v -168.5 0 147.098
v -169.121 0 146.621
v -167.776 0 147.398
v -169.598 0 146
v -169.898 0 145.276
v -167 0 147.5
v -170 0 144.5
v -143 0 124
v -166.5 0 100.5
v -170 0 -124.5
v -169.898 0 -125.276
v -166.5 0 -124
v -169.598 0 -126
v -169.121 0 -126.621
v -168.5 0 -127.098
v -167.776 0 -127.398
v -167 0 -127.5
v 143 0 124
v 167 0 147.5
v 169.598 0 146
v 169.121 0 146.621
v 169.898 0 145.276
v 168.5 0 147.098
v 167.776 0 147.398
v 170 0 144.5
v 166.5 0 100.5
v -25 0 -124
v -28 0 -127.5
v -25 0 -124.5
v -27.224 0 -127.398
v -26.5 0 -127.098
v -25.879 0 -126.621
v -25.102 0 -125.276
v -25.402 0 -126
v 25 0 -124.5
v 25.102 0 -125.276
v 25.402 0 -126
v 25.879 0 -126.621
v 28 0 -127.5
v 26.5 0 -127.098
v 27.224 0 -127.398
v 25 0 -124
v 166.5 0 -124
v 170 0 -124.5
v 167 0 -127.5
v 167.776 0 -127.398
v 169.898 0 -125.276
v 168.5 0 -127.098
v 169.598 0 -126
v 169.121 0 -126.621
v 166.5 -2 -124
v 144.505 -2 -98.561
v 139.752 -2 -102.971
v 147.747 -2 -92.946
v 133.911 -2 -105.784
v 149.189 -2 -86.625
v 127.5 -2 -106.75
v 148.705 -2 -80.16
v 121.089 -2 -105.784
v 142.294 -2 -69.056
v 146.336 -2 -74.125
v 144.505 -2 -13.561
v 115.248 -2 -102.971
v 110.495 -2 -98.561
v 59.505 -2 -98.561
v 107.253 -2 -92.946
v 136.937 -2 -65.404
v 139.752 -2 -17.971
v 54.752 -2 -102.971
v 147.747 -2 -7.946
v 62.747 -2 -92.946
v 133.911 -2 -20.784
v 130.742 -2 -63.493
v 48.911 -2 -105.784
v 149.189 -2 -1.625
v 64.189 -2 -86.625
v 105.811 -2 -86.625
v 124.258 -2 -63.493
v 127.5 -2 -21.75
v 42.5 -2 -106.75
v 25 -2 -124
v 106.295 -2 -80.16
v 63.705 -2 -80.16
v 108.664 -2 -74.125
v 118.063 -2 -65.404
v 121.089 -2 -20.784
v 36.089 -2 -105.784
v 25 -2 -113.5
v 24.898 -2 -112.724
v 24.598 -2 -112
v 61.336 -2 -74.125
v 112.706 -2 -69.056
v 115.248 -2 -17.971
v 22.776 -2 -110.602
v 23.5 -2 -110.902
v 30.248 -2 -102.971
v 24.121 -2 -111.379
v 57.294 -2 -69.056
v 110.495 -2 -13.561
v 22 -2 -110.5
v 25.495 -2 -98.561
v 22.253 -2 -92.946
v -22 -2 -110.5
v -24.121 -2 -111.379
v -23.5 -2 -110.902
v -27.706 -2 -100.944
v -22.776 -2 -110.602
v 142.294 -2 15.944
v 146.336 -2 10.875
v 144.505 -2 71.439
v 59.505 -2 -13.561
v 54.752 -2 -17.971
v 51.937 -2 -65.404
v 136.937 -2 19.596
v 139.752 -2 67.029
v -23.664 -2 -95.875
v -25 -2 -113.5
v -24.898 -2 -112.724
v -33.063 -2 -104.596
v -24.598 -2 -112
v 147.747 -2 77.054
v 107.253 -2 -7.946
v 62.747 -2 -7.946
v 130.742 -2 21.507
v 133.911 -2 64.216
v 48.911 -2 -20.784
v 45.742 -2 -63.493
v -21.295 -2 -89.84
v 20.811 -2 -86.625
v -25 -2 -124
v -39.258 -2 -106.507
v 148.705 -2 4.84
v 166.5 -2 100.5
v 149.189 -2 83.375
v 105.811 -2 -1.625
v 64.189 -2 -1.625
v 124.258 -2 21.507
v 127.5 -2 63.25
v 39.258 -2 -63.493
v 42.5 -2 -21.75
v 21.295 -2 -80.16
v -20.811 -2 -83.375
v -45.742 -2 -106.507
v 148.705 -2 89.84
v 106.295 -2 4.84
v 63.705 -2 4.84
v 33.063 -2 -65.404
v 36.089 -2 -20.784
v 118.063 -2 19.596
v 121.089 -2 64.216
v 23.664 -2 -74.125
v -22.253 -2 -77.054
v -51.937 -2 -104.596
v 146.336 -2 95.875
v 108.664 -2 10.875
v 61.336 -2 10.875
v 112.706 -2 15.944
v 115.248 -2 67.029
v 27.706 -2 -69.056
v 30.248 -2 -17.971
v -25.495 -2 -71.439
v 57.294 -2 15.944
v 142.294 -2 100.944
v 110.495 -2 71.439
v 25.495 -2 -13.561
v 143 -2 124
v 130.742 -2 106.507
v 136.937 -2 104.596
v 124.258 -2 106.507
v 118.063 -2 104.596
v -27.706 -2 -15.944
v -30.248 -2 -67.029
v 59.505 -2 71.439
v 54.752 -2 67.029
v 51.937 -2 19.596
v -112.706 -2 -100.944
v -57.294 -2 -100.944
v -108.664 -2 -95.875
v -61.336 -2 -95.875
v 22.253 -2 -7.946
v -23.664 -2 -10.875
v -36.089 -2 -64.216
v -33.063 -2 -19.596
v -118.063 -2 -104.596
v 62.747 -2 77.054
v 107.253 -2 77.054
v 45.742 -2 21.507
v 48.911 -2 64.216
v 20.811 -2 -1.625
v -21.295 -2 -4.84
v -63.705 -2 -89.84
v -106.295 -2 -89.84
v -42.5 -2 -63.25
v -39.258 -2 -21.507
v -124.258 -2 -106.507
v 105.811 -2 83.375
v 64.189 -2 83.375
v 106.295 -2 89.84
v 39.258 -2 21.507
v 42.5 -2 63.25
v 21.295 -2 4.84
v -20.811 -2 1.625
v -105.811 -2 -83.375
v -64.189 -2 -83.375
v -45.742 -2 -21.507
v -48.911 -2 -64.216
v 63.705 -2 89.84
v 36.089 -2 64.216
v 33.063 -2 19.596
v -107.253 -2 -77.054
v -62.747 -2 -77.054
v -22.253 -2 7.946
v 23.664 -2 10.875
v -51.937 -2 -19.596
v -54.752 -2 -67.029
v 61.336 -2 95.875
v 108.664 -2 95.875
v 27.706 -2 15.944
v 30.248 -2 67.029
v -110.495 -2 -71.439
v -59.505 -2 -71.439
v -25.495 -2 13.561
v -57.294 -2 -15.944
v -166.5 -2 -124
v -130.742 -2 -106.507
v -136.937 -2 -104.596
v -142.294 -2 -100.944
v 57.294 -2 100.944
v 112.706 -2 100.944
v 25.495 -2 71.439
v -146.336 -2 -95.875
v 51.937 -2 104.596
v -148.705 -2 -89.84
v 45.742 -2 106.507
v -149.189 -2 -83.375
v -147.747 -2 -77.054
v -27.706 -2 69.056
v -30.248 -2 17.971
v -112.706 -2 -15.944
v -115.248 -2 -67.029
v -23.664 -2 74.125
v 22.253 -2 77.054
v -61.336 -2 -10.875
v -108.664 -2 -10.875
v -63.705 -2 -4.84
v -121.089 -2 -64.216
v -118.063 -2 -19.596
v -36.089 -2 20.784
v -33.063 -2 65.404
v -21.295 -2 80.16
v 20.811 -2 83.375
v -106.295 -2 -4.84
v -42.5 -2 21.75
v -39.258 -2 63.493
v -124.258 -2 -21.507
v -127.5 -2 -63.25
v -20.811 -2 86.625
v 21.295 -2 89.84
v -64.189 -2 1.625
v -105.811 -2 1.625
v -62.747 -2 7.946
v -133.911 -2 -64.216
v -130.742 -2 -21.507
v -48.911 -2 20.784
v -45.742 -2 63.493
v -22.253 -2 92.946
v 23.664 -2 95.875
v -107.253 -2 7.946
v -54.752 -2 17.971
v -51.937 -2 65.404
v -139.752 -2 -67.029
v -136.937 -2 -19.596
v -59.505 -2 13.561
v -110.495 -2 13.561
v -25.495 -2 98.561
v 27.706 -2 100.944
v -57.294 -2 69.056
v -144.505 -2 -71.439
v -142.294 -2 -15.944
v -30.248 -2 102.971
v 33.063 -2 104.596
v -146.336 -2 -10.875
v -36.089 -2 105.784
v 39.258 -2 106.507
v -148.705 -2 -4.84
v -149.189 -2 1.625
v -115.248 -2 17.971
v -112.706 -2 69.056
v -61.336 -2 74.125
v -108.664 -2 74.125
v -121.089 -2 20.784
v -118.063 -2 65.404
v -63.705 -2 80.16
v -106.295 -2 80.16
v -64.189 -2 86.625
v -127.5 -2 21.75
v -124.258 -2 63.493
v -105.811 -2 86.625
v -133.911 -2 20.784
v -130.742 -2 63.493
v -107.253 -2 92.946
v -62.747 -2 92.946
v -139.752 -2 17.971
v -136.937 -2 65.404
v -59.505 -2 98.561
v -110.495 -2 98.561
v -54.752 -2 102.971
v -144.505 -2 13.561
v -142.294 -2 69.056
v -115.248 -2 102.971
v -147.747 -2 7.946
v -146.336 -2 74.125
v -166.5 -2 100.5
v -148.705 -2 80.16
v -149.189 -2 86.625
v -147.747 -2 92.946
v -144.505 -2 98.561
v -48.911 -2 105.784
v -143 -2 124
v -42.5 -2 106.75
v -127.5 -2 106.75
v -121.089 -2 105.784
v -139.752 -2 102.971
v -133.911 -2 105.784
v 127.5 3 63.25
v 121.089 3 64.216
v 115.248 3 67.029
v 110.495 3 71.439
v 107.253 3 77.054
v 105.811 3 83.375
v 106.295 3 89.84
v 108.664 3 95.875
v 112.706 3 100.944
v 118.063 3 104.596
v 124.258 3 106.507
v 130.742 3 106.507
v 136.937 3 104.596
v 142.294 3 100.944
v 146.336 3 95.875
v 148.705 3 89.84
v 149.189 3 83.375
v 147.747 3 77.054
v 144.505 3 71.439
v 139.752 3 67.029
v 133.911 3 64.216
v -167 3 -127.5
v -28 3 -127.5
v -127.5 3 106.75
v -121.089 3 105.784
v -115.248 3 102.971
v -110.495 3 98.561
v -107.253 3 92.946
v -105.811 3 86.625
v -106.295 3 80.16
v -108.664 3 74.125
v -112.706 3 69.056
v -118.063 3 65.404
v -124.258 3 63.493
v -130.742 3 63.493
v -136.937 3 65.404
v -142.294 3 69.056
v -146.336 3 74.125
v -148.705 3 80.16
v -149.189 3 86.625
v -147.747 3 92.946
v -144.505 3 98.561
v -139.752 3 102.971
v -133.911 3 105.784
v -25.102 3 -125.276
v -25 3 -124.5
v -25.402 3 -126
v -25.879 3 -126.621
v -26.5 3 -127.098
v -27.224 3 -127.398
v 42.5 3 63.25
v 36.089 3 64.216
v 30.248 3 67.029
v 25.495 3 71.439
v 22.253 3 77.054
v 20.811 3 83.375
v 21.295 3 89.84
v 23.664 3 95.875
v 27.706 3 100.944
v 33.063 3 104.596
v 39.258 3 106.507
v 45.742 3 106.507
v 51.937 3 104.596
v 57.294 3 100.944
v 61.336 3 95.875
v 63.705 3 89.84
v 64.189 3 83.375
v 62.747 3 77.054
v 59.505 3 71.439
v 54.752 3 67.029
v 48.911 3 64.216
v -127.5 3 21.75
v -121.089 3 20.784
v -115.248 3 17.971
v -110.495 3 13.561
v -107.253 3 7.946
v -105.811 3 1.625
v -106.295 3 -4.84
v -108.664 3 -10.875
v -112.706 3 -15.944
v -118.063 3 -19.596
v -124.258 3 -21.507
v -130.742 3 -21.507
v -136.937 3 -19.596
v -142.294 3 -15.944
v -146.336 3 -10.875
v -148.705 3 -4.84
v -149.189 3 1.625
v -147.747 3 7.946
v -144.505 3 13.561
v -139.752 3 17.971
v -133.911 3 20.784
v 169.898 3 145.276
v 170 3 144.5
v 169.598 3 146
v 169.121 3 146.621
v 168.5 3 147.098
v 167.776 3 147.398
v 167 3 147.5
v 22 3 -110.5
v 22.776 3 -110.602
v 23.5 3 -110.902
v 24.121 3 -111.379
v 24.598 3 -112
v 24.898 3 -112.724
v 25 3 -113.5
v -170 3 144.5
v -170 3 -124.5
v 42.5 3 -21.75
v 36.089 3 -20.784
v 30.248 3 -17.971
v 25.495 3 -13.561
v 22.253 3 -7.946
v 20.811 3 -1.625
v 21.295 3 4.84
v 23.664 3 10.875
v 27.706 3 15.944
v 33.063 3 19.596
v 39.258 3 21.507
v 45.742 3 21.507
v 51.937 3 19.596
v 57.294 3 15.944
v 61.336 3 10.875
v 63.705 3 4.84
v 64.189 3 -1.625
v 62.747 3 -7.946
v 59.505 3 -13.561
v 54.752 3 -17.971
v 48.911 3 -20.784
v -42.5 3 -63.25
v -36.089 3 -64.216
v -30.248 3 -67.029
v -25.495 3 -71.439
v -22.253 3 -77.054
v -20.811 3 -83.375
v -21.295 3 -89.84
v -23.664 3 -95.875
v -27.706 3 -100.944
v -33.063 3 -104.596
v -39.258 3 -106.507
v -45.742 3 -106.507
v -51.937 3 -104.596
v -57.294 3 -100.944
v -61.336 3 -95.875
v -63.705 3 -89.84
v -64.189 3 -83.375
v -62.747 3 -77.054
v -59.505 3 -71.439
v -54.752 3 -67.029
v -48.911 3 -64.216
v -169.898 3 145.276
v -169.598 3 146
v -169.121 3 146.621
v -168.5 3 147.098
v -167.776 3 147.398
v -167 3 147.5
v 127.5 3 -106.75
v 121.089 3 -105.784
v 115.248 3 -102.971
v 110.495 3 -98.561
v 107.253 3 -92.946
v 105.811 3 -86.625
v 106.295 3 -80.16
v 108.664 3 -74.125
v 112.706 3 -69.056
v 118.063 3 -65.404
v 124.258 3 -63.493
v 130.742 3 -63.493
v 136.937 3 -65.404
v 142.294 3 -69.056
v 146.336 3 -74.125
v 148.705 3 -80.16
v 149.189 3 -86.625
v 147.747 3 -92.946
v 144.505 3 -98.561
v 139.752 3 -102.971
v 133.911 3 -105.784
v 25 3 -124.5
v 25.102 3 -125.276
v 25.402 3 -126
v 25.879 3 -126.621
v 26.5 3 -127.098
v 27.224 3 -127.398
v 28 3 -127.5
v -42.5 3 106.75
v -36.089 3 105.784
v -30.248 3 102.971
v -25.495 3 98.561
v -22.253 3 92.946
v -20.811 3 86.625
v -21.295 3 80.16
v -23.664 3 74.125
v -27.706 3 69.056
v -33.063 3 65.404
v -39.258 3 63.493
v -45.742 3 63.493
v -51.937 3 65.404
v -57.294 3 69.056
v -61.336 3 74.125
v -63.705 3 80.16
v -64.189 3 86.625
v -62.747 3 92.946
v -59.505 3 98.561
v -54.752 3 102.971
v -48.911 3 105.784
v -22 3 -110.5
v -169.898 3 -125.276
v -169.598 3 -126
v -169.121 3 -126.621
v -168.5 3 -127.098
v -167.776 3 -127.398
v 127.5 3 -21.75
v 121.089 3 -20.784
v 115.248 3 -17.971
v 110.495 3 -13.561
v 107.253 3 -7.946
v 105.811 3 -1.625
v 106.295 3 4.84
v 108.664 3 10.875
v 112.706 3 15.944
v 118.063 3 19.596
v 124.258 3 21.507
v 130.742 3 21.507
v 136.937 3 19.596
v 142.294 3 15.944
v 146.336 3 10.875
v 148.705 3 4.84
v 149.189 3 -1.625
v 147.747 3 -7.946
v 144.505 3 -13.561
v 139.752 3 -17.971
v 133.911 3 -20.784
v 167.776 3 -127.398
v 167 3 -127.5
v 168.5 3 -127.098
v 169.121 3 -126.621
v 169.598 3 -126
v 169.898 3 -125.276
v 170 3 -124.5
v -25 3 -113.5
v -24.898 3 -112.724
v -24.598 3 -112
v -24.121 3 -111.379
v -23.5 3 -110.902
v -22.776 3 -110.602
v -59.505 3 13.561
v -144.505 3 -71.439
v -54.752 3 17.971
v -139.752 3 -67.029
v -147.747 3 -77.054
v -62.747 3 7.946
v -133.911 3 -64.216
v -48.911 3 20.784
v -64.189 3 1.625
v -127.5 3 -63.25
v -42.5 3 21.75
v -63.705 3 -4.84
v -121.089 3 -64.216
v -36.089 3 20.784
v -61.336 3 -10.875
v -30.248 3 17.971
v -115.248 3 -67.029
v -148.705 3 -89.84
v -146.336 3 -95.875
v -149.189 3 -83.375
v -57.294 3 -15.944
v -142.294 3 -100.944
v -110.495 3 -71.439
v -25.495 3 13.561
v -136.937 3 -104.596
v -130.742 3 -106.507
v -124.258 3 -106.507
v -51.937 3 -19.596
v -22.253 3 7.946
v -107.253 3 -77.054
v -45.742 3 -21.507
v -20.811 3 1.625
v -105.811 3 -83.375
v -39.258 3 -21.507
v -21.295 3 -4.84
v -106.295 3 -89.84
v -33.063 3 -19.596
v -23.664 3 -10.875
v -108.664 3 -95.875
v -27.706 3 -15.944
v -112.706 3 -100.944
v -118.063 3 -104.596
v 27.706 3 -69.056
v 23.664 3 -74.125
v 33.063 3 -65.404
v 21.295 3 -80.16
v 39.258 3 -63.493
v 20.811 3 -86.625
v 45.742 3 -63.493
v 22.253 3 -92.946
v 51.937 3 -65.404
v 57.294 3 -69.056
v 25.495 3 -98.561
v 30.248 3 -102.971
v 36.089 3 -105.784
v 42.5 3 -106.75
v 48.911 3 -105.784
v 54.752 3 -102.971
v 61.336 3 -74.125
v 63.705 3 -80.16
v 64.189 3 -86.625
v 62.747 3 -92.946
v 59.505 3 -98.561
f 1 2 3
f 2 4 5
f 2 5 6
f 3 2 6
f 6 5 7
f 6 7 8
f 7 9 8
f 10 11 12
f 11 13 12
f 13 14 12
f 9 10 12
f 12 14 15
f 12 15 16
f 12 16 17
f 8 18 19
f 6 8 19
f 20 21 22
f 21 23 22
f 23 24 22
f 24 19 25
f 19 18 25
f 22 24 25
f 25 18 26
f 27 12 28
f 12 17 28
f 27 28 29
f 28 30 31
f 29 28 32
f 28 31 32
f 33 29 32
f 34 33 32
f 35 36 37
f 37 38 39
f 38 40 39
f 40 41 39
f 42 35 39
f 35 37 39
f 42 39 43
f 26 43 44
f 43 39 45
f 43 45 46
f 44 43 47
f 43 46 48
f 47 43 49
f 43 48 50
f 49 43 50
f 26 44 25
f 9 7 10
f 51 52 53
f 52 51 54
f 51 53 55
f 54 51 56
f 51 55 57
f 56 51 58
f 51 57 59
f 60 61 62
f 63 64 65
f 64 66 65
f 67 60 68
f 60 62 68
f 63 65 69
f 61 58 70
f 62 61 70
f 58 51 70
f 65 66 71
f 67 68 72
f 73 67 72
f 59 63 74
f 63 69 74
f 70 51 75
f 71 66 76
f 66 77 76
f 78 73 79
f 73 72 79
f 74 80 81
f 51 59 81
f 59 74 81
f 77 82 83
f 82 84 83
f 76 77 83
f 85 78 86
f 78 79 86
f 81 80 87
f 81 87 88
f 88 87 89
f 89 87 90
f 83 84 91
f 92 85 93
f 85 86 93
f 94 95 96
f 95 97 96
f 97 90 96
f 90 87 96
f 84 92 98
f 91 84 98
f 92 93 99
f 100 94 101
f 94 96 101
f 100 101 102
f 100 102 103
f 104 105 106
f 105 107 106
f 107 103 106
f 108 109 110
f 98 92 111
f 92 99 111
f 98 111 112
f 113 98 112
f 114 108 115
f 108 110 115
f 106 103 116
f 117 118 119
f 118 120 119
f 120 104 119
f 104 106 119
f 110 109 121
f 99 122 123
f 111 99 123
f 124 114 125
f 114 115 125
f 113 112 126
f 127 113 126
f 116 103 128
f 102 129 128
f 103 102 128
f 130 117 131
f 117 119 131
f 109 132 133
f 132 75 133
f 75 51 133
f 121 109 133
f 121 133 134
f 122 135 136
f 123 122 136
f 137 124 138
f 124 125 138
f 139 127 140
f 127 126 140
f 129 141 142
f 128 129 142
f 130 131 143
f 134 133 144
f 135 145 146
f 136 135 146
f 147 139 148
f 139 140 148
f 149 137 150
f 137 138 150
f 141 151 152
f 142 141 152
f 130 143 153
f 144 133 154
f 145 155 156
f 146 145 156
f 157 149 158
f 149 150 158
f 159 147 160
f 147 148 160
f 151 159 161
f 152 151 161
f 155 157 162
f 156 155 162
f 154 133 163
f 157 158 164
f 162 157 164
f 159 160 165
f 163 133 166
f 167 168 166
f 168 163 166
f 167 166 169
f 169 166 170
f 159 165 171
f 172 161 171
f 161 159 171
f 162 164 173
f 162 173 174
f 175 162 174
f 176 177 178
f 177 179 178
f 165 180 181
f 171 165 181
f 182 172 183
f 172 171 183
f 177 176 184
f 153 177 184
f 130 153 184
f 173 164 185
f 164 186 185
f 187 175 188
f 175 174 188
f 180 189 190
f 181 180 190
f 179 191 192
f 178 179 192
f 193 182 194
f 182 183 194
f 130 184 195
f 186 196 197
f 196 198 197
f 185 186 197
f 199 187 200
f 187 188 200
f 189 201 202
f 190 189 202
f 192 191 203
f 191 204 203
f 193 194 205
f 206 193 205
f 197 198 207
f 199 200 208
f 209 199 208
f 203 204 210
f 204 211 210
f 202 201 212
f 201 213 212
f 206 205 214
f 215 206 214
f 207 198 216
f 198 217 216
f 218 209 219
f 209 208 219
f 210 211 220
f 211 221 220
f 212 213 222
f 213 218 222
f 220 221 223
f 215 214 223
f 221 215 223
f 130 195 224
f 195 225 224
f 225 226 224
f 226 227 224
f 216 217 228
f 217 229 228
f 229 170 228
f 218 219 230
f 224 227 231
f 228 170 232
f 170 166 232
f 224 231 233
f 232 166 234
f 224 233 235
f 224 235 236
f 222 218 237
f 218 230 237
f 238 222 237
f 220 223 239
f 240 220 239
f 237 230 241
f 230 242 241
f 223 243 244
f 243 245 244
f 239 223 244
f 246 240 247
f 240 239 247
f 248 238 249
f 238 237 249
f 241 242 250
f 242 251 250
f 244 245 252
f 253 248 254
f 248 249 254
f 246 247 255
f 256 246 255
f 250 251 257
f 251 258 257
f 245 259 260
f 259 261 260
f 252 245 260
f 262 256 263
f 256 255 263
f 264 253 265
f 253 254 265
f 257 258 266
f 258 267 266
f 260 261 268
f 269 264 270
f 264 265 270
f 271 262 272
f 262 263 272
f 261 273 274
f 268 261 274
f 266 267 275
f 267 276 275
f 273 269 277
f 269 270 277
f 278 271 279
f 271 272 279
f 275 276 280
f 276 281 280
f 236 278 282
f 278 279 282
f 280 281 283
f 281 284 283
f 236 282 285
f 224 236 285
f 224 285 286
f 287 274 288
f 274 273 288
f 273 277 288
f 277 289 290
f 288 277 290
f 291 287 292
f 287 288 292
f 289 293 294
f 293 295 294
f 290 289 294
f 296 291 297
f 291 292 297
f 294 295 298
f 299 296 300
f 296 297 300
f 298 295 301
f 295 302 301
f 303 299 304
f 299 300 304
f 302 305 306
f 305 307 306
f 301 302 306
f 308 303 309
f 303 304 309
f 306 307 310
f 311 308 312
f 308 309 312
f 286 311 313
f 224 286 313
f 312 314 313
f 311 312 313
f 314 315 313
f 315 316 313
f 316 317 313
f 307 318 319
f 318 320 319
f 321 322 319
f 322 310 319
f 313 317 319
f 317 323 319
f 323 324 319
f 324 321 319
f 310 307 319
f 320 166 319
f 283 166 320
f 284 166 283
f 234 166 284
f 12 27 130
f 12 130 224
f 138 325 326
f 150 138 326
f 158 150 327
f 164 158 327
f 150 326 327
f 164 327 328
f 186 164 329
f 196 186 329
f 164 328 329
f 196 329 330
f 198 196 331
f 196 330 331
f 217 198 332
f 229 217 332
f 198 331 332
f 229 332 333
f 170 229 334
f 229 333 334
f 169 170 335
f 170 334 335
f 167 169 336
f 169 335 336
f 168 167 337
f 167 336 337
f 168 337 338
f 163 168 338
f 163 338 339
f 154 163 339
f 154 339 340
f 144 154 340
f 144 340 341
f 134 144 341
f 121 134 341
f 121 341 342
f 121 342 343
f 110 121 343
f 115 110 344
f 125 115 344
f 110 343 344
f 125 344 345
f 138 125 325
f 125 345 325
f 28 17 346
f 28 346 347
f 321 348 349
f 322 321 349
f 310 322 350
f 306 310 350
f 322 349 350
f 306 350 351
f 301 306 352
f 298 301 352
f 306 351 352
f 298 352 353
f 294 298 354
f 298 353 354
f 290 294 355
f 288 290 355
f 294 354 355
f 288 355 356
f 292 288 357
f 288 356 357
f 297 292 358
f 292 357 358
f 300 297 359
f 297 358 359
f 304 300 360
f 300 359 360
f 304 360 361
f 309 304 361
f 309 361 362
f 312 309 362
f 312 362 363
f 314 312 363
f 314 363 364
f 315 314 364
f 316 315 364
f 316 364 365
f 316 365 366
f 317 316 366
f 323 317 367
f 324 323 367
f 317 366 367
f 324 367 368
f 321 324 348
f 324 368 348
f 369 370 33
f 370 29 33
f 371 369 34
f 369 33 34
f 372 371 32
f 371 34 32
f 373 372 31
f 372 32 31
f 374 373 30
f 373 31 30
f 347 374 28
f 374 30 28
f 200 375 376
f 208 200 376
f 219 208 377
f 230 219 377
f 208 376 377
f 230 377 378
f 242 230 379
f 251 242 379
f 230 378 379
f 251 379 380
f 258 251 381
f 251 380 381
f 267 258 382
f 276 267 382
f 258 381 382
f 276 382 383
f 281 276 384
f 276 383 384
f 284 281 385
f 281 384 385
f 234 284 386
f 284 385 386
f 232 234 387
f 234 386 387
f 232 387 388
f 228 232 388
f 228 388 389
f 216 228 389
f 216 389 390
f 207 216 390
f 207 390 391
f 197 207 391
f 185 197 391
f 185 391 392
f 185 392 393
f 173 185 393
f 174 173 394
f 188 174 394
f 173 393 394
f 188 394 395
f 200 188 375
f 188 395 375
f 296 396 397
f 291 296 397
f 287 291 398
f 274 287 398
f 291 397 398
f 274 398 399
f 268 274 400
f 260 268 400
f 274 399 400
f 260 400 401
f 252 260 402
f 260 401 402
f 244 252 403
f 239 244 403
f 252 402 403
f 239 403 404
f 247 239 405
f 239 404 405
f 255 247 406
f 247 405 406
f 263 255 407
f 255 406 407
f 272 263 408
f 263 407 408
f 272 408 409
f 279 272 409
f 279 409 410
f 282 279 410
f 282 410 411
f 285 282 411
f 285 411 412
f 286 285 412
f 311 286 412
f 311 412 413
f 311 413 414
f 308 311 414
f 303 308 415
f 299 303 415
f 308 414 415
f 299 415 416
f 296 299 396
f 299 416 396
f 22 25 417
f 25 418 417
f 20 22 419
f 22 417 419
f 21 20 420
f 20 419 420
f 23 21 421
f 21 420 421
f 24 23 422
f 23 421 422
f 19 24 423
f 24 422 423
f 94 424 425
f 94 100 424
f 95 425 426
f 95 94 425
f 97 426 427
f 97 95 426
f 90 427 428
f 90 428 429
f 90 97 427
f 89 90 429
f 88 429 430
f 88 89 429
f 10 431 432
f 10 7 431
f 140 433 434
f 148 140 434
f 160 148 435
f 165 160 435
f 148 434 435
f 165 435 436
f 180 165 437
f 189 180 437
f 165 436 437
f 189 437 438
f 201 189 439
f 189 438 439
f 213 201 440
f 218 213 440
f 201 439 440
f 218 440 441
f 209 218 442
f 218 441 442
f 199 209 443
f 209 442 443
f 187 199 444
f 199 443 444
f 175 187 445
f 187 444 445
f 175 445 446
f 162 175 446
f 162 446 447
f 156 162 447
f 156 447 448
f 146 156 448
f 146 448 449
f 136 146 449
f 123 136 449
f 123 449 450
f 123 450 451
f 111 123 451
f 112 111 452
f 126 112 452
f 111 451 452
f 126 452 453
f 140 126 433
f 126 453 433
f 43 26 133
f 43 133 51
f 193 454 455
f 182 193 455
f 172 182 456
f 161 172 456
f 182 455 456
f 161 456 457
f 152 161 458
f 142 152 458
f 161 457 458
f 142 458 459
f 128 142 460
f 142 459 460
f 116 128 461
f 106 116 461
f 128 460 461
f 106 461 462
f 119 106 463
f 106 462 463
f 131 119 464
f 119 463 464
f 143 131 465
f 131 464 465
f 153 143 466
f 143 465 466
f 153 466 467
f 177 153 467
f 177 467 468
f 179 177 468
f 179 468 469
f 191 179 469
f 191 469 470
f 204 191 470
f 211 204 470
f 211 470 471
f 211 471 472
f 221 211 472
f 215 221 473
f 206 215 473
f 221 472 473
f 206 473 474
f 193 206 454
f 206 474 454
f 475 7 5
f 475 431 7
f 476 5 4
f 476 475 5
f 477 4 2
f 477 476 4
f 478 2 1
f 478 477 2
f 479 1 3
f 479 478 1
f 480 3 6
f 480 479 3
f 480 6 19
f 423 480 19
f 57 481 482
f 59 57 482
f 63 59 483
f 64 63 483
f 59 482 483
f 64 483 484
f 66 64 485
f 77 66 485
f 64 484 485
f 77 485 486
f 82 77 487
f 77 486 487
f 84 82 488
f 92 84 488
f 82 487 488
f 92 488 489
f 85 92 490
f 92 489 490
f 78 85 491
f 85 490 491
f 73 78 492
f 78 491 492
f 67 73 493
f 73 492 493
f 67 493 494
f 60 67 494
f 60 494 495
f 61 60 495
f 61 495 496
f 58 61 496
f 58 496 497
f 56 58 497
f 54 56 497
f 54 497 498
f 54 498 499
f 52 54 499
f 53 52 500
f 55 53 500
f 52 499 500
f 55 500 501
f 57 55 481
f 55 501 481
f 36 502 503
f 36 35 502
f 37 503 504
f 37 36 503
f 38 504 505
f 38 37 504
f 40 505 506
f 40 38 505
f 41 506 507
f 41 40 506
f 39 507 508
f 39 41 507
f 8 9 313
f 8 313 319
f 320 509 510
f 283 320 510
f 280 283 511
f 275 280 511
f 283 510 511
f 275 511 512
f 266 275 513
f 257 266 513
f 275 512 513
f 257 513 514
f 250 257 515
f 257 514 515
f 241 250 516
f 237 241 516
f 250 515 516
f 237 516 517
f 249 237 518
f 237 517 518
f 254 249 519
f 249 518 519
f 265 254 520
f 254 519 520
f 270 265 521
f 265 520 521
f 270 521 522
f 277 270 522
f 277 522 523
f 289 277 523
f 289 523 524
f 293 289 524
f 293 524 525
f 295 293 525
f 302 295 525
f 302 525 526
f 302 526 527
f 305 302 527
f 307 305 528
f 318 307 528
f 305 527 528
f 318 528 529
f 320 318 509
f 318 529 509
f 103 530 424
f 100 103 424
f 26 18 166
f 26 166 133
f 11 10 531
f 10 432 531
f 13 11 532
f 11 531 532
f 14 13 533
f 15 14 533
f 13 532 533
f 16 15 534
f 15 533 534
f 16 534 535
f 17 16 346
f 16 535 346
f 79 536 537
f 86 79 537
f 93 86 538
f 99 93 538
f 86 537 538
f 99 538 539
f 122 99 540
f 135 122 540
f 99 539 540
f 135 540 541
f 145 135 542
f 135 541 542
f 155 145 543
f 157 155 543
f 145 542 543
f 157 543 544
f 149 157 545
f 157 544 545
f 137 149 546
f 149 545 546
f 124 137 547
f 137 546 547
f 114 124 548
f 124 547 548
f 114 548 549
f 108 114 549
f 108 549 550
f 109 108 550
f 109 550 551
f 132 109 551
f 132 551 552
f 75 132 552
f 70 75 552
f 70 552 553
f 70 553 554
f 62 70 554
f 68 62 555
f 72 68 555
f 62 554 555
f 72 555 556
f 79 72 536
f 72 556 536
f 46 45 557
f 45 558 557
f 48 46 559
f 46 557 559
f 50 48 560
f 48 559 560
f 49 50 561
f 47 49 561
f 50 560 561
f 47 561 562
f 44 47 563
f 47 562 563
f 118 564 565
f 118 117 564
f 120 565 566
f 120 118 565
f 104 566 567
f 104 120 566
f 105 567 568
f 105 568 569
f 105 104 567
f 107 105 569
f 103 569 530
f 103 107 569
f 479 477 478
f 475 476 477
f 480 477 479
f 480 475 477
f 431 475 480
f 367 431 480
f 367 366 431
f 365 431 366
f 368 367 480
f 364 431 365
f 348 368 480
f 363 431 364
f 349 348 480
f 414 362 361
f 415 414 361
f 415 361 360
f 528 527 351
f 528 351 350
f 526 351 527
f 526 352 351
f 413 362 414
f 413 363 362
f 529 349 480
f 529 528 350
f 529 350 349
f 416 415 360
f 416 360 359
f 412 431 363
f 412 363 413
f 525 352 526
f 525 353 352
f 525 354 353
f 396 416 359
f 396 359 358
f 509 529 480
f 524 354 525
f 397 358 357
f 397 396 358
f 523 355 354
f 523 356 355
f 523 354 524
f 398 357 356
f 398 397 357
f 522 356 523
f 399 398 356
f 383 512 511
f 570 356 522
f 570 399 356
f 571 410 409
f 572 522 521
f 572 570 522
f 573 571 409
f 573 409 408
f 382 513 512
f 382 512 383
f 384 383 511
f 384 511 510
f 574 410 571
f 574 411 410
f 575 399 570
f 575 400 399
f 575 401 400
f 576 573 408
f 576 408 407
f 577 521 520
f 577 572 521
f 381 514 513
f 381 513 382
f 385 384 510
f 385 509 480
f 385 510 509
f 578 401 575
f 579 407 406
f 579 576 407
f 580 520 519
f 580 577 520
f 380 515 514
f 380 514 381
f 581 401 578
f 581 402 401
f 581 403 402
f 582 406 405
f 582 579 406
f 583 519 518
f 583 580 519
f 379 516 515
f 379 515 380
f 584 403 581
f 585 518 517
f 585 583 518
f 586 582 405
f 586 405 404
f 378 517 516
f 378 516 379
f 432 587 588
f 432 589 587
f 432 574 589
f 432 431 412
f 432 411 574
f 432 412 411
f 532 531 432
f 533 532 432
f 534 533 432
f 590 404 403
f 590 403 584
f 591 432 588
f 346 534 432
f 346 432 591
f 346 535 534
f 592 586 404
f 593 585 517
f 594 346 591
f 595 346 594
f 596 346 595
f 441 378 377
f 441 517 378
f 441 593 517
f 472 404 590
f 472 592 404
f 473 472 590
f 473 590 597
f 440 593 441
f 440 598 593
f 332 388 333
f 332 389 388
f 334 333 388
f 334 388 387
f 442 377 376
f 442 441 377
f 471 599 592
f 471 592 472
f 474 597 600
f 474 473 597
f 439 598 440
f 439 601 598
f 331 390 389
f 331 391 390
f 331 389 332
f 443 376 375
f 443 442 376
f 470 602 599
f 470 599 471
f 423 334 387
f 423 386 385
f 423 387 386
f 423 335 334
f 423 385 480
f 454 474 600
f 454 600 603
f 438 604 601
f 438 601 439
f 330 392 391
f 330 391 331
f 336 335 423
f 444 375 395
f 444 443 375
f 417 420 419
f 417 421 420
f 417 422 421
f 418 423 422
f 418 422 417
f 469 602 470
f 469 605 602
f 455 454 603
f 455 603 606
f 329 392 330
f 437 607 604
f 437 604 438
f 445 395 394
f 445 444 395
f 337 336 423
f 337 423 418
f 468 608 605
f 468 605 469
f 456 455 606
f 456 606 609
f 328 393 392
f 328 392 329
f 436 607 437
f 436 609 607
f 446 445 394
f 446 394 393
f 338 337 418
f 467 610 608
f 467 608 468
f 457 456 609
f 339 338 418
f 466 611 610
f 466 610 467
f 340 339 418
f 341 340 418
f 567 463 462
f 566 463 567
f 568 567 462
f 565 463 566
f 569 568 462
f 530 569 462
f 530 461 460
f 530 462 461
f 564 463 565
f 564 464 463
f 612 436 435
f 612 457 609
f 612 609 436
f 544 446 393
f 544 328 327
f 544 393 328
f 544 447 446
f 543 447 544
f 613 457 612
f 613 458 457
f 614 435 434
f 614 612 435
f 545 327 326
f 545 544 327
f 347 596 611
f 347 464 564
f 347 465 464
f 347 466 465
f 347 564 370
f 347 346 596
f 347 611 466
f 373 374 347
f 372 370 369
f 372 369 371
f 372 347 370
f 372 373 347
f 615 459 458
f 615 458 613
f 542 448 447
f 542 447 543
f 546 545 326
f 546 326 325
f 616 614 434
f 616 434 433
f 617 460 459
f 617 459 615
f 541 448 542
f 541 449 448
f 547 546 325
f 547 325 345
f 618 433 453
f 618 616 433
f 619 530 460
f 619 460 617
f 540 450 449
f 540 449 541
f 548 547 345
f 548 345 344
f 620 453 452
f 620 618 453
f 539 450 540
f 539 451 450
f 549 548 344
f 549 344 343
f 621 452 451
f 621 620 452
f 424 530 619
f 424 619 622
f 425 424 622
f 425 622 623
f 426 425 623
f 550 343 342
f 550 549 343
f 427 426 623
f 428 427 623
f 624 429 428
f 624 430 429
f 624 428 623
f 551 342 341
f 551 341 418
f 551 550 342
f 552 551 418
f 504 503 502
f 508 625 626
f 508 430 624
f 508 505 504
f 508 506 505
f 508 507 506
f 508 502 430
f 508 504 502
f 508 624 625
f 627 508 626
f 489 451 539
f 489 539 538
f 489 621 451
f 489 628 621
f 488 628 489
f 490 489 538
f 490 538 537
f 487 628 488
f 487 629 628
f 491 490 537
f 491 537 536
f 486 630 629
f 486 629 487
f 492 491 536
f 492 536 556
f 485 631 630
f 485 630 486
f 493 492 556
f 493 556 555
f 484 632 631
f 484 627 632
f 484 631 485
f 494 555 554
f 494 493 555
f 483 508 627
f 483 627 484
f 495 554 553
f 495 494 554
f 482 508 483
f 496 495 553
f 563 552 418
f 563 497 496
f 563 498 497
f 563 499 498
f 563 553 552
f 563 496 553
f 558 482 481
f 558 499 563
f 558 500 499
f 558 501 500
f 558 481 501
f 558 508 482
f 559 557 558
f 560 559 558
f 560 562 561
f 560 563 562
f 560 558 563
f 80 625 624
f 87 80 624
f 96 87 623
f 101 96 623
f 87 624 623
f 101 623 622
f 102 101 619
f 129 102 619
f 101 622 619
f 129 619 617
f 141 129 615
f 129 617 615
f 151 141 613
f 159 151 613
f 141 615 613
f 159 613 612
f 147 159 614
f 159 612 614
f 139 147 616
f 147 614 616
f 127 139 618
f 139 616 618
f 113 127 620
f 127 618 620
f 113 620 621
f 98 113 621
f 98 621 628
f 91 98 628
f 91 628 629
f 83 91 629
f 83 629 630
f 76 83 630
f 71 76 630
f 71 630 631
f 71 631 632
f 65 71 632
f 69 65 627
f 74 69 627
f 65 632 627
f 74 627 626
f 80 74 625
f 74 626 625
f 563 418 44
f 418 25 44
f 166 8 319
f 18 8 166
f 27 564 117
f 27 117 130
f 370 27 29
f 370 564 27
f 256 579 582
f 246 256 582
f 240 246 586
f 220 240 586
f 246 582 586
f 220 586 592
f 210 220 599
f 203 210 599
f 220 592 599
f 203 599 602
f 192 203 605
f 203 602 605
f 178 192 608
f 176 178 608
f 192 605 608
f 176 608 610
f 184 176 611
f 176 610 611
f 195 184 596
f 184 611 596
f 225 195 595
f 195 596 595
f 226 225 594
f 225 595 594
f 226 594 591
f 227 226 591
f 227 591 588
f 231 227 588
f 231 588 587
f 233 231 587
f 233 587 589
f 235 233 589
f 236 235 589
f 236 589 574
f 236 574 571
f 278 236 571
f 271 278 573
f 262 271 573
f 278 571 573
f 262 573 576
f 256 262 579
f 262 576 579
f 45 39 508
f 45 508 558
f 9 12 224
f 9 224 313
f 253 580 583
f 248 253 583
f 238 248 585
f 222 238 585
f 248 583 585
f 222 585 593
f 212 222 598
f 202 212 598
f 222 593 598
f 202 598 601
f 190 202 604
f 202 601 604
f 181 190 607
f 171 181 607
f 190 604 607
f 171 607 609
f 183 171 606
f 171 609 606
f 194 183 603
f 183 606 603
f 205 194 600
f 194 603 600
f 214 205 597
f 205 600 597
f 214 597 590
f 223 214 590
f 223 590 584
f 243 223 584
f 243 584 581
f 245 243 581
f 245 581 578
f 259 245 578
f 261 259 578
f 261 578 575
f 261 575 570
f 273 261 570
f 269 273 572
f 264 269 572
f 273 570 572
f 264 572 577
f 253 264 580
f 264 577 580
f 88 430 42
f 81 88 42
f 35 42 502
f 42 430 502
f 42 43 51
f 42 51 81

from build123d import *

# Parameters (mm, degrees)
SKETCH_1_W          = 340
SKETCH_1_H          = 255
EXTRUDE_1_DEPTH     = 3
EXTRUDE_2_DEPTH     = 2
SKETCH_3_R          = 21.75
SKETCH_3_W          = 50
SKETCH_3_H          = 17
CUT_EXTRUDE_1_DEPTH = 5
EXTRUDE_START       = -3
SKETCH_4_W          = 340
SKETCH_4_H          = 20
EXTRUDE_3_DEPTH     = 3
FILLET_1_R          = 3


with BuildPart() as part:
    # 草圖1 → 填料-伸長1 (new body)
    with BuildSketch(Plane(origin=(0, 0, 0), x_dir=(1, 0, 0), z_dir=(0, 1, 0))):
        Rectangle(SKETCH_1_W, SKETCH_1_H)
    extrude(amount=EXTRUDE_1_DEPTH)

    # 草圖2 → 填料-伸長2 (add)
    with BuildSketch(Plane.XZ):
        Polygon((-166.5, 100.5), (-143, 124), (143, 124), (166.5, 100.5), (166.5, -124), (-166.5, -124), align=None)
    extrude(amount=EXTRUDE_2_DEPTH)

    # 草圖3 → 除料-伸長1 (cut)
    with BuildSketch(Plane(origin=(0, 3, 0), x_dir=(1, 0, 0), z_dir=(0, 1, 0))):
        with Locations(Location((-127.5, 85, 0), (0, 0, 270))):
            Circle(SKETCH_3_R)
        with Locations(Location((-42.5, 85, 0), (0, 0, 270))):
            Circle(SKETCH_3_R)
        with Locations(Location((-127.5, 0, 0), (0, 0, 270))):
            Circle(SKETCH_3_R)
        with Locations(Location((-42.5, 0, 0), (0, 0, 270))):
            Circle(SKETCH_3_R)
        with Locations(Location((-127.5, -85, 0), (0, 0, 270))):
            Circle(SKETCH_3_R)
        with Locations(Location((-42.5, -85, 0), (0, 0, 270))):
            Circle(SKETCH_3_R)
        with Locations(Location((127.5, -85, 0), (0, 0, 90))):
            Circle(SKETCH_3_R)
        with Locations(Location((42.5, -85, 0), (0, 0, 90))):
            Circle(SKETCH_3_R)
        with Locations(Location((42.5, 0, 0), (0, 0, 90))):
            Circle(SKETCH_3_R)
        with Locations(Location((127.5, 0, 0), (0, 0, 90))):
            Circle(SKETCH_3_R)
        with Locations(Location((127.5, 85, 0), (0, 0, 90))):
            Circle(SKETCH_3_R)
        with Locations(Location((42.5, 85, 0), (0, 0, 90))):
            Circle(SKETCH_3_R)
        with Locations((0, 119)):
            Rectangle(SKETCH_3_W, SKETCH_3_H)
    extrude(amount=-CUT_EXTRUDE_1_DEPTH, mode=Mode.SUBTRACT)

    # 草圖4 → 填料-伸長3 (add)
    with BuildSketch(Plane(origin=(0, 3, 0), x_dir=(1, 0, 0), z_dir=(0, 1, 0)).offset(EXTRUDE_START)):
        with Locations((0, -137.5)):
            Rectangle(SKETCH_4_W, SKETCH_4_H)
    extrude(amount=EXTRUDE_3_DEPTH)

    # 圓角1
    fillet_1_edges = [part.edges().sort_by_distance(p)[0] for p in [
        (-170, 1.5, 147.5),
        (170, 1.5, 147.5),
        (-25, 1.5, -127.5),
        (-25, 0.5, -110.5),
        (25, 1.5, -127.5),
        (25, 0.5, -110.5),
        (-170, 1.5, -127.5),
        (170, 1.5, -127.5),
    ]]
    fillet(fillet_1_edges, radius=FILLET_1_R)


solid = part.part
